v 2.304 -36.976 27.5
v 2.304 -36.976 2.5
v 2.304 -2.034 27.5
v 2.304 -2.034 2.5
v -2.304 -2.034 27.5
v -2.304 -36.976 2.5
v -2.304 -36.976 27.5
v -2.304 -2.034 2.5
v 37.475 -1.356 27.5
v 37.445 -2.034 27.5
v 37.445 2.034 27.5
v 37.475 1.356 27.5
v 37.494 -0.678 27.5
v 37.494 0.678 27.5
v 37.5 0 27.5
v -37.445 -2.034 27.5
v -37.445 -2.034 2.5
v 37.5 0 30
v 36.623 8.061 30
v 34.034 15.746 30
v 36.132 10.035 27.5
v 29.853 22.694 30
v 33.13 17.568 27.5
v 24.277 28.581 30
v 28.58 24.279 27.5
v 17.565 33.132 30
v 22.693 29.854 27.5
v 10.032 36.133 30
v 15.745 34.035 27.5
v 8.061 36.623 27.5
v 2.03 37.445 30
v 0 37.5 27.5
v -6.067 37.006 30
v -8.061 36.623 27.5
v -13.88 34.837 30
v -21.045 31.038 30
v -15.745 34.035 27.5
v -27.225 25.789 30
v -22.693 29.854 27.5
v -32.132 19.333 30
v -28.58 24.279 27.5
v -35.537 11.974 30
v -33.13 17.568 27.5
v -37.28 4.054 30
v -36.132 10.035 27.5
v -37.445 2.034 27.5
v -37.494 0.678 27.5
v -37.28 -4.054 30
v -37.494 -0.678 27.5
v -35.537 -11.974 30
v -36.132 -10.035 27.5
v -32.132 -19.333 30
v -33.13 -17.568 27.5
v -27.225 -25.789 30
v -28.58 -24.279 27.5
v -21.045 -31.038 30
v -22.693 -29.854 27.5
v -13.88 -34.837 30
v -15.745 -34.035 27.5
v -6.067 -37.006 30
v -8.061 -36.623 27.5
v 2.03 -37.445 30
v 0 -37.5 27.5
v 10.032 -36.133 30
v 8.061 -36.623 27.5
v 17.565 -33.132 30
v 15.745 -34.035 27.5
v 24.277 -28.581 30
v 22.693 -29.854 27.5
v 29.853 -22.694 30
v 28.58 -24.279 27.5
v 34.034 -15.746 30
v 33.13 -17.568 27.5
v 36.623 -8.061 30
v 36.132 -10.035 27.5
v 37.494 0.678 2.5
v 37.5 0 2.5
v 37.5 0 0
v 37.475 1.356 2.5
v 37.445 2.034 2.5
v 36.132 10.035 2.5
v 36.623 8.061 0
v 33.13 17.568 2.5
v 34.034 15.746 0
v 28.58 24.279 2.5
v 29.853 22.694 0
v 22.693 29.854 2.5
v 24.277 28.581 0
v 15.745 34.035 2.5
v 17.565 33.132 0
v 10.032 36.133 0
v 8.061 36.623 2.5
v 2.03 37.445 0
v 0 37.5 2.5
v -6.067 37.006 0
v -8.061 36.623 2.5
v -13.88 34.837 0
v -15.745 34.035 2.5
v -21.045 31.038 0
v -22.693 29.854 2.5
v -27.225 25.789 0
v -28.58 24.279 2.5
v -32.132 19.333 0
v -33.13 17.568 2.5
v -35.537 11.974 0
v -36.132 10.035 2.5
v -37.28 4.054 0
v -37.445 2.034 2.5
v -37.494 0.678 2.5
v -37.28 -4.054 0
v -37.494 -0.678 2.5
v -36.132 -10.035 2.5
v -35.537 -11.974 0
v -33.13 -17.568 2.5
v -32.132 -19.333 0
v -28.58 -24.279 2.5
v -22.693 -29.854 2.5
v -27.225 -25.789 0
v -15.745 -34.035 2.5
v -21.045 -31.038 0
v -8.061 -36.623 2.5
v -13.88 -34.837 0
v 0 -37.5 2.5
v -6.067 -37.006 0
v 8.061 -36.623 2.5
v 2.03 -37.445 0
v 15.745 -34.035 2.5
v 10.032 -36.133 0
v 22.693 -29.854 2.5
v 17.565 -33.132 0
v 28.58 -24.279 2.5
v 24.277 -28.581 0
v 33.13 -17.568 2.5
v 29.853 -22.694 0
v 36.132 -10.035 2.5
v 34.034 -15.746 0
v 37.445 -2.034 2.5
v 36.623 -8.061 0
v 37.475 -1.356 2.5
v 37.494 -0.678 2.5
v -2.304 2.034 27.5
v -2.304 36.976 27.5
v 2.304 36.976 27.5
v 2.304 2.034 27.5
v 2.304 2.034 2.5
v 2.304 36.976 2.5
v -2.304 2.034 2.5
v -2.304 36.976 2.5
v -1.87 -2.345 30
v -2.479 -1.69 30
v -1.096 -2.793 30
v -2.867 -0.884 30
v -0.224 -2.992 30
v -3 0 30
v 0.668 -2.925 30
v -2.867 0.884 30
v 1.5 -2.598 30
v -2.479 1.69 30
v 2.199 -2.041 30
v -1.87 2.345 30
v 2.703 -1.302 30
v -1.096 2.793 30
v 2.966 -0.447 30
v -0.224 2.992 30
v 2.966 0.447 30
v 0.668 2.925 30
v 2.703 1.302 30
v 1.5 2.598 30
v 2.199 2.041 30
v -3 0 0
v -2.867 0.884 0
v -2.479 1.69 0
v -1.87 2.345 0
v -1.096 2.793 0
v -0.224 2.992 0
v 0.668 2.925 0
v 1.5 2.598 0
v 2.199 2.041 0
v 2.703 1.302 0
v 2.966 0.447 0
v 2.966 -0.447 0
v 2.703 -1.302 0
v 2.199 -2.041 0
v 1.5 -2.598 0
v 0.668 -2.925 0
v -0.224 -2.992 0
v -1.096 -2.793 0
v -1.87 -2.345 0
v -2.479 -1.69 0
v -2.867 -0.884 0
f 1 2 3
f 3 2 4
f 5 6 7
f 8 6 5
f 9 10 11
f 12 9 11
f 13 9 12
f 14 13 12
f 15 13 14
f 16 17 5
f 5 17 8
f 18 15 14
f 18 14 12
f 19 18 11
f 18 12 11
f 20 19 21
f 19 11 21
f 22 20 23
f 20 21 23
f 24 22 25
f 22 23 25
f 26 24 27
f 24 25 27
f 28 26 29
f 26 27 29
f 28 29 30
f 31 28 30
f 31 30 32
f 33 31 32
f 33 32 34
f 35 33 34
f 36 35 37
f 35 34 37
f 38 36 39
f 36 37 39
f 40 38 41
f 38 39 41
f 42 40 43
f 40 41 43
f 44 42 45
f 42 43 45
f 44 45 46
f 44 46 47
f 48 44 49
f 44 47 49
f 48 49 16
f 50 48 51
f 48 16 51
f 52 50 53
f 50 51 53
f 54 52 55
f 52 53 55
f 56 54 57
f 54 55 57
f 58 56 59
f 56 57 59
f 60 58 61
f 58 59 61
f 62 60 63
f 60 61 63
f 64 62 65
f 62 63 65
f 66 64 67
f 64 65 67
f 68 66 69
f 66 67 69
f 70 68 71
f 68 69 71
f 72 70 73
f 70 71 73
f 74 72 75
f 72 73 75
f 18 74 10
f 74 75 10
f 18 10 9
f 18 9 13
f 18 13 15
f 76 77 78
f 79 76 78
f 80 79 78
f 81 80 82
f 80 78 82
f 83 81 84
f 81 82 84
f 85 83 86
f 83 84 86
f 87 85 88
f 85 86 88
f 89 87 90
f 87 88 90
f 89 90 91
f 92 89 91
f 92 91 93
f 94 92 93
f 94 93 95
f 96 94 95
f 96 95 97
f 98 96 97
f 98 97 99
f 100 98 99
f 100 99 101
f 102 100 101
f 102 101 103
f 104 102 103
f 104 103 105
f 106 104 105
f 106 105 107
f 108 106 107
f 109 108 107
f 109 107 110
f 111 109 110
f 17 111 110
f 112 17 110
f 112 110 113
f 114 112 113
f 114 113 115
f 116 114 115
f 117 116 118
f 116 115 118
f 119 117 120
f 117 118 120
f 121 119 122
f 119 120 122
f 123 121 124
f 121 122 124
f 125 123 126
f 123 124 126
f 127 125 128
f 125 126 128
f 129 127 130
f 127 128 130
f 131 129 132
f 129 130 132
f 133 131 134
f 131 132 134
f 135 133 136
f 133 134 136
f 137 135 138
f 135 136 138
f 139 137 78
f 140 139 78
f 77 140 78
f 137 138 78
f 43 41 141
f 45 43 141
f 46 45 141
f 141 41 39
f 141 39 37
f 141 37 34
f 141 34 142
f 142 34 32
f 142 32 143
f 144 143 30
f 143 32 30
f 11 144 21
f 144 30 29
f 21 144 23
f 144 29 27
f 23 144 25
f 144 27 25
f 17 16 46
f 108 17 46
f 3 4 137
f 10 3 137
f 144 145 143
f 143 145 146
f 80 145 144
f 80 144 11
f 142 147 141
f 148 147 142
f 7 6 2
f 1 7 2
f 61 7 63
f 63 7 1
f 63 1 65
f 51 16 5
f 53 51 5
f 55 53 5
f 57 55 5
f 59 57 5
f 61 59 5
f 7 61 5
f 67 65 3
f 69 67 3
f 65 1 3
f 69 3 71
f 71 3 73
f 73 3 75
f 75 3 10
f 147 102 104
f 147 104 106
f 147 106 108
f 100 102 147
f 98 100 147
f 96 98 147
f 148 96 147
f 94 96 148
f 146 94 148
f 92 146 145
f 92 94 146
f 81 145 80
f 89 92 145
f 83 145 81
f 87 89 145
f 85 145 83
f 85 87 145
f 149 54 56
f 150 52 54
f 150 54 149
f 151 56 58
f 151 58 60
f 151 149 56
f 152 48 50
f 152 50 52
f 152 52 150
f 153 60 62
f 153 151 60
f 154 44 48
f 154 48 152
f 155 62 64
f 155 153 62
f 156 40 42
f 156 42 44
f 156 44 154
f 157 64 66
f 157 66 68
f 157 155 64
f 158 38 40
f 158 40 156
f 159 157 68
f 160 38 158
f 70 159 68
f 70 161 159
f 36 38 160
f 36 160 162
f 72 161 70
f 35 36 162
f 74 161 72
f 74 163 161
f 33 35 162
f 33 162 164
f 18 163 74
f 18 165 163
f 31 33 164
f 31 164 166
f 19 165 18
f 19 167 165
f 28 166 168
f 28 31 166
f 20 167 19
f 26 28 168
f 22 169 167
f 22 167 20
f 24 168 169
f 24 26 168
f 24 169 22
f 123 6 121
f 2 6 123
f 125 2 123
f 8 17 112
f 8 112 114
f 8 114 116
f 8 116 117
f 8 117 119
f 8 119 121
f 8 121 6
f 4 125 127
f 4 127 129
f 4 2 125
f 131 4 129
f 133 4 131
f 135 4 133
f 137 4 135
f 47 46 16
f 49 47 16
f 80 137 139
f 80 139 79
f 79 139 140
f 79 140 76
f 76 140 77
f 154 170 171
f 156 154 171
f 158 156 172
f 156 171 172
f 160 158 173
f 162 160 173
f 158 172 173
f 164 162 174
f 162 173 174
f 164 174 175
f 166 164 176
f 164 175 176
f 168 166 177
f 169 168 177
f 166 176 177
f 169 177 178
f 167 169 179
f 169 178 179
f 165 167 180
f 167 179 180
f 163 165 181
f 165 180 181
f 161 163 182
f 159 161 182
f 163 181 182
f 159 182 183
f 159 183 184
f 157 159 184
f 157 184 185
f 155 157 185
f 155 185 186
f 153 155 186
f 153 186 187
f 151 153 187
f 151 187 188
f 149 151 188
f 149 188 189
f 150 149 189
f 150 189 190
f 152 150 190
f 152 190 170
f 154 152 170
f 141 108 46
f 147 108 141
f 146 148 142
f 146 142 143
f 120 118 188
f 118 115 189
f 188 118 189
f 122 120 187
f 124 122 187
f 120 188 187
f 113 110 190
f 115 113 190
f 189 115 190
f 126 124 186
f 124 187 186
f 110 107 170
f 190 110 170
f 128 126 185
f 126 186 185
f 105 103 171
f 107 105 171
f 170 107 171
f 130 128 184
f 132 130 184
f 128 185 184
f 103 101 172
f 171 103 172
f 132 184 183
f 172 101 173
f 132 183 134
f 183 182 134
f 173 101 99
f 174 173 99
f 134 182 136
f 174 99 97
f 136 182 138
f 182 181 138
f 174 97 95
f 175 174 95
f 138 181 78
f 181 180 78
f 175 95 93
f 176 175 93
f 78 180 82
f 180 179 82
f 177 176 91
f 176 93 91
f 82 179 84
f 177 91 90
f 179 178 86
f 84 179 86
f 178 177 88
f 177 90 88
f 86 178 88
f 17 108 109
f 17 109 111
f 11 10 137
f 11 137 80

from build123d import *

# Parameters (mm, degrees)
F0_R     = 37.5
F1_DEPTH = 2.5
F2_W     = 74.8896048808
F2_H     = 4.0678103206
F3_DEPTH = 25
F4_W     = 4.6082469635
F4_H     = 73.9512071013
F5_DEPTH = 25
F6_R     = 37.5
F7_DEPTH = 2.5
F9_D     = 6


with BuildPart() as f1:
    # F0 (on Top) → F1 (new body)
    with BuildSketch(Plane.XY):
        Circle(F0_R)
    extrude(amount=F1_DEPTH)

    # F2 (on face) → F3 (join)
    with BuildSketch(Plane.XY.offset(2.5)):
        Rectangle(F2_W, F2_H)
    extrude(amount=F3_DEPTH)

    # F4 (on face) → F5 (join)
    with BuildSketch(Plane.XY.offset(2.5)):
        Rectangle(F4_W, F4_H)
    extrude(amount=F5_DEPTH)

    # F6 (on face) → F7 (join)
    with BuildSketch(Plane.XY.offset(27.5)):
        Circle(F6_R)
    extrude(amount=F7_DEPTH)

    # F9 (through all)
    with Locations(Plane.XY.offset(30)):
        with Locations((0, 0)):
            Hole(F9_D / 2)


solid = f1.part
